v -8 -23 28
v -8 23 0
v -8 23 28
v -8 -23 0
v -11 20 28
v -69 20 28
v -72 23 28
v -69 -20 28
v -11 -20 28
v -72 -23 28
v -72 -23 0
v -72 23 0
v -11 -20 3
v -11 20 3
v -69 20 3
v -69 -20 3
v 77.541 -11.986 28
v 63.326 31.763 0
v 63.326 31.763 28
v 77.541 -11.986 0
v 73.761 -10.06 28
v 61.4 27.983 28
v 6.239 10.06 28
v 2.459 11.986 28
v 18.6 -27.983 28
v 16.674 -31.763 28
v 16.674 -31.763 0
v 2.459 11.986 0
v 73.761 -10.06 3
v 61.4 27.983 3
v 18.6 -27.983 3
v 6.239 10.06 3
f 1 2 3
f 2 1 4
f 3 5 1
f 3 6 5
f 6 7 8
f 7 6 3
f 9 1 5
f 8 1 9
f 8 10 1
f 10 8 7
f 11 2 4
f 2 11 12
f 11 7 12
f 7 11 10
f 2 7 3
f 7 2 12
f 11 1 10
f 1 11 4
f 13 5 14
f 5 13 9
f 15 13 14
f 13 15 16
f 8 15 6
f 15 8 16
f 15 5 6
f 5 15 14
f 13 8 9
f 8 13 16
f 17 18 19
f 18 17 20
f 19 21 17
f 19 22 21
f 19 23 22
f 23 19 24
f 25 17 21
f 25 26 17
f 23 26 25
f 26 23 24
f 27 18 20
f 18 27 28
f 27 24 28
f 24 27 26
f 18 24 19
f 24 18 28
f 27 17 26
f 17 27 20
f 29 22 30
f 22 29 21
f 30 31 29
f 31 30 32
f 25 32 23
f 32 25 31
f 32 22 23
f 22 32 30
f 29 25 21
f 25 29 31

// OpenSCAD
// Two calls to the same module. Pick one housing: only that instance changes.
width = 64;
depth = 46;
height = 28;
wall = 3;

module housing(w, d, h) {
    difference() {
        cube([w, d, h], center=true);
        translate([0,0,wall]) cube([w-2*wall,d-2*wall,h],center=true);
    }
}
translate([-width/2-8,0,height/2]) housing(width,depth,height);
translate([width/2+8,0,height/2]) rotate([0,0,18]) housing(width,depth,height);
